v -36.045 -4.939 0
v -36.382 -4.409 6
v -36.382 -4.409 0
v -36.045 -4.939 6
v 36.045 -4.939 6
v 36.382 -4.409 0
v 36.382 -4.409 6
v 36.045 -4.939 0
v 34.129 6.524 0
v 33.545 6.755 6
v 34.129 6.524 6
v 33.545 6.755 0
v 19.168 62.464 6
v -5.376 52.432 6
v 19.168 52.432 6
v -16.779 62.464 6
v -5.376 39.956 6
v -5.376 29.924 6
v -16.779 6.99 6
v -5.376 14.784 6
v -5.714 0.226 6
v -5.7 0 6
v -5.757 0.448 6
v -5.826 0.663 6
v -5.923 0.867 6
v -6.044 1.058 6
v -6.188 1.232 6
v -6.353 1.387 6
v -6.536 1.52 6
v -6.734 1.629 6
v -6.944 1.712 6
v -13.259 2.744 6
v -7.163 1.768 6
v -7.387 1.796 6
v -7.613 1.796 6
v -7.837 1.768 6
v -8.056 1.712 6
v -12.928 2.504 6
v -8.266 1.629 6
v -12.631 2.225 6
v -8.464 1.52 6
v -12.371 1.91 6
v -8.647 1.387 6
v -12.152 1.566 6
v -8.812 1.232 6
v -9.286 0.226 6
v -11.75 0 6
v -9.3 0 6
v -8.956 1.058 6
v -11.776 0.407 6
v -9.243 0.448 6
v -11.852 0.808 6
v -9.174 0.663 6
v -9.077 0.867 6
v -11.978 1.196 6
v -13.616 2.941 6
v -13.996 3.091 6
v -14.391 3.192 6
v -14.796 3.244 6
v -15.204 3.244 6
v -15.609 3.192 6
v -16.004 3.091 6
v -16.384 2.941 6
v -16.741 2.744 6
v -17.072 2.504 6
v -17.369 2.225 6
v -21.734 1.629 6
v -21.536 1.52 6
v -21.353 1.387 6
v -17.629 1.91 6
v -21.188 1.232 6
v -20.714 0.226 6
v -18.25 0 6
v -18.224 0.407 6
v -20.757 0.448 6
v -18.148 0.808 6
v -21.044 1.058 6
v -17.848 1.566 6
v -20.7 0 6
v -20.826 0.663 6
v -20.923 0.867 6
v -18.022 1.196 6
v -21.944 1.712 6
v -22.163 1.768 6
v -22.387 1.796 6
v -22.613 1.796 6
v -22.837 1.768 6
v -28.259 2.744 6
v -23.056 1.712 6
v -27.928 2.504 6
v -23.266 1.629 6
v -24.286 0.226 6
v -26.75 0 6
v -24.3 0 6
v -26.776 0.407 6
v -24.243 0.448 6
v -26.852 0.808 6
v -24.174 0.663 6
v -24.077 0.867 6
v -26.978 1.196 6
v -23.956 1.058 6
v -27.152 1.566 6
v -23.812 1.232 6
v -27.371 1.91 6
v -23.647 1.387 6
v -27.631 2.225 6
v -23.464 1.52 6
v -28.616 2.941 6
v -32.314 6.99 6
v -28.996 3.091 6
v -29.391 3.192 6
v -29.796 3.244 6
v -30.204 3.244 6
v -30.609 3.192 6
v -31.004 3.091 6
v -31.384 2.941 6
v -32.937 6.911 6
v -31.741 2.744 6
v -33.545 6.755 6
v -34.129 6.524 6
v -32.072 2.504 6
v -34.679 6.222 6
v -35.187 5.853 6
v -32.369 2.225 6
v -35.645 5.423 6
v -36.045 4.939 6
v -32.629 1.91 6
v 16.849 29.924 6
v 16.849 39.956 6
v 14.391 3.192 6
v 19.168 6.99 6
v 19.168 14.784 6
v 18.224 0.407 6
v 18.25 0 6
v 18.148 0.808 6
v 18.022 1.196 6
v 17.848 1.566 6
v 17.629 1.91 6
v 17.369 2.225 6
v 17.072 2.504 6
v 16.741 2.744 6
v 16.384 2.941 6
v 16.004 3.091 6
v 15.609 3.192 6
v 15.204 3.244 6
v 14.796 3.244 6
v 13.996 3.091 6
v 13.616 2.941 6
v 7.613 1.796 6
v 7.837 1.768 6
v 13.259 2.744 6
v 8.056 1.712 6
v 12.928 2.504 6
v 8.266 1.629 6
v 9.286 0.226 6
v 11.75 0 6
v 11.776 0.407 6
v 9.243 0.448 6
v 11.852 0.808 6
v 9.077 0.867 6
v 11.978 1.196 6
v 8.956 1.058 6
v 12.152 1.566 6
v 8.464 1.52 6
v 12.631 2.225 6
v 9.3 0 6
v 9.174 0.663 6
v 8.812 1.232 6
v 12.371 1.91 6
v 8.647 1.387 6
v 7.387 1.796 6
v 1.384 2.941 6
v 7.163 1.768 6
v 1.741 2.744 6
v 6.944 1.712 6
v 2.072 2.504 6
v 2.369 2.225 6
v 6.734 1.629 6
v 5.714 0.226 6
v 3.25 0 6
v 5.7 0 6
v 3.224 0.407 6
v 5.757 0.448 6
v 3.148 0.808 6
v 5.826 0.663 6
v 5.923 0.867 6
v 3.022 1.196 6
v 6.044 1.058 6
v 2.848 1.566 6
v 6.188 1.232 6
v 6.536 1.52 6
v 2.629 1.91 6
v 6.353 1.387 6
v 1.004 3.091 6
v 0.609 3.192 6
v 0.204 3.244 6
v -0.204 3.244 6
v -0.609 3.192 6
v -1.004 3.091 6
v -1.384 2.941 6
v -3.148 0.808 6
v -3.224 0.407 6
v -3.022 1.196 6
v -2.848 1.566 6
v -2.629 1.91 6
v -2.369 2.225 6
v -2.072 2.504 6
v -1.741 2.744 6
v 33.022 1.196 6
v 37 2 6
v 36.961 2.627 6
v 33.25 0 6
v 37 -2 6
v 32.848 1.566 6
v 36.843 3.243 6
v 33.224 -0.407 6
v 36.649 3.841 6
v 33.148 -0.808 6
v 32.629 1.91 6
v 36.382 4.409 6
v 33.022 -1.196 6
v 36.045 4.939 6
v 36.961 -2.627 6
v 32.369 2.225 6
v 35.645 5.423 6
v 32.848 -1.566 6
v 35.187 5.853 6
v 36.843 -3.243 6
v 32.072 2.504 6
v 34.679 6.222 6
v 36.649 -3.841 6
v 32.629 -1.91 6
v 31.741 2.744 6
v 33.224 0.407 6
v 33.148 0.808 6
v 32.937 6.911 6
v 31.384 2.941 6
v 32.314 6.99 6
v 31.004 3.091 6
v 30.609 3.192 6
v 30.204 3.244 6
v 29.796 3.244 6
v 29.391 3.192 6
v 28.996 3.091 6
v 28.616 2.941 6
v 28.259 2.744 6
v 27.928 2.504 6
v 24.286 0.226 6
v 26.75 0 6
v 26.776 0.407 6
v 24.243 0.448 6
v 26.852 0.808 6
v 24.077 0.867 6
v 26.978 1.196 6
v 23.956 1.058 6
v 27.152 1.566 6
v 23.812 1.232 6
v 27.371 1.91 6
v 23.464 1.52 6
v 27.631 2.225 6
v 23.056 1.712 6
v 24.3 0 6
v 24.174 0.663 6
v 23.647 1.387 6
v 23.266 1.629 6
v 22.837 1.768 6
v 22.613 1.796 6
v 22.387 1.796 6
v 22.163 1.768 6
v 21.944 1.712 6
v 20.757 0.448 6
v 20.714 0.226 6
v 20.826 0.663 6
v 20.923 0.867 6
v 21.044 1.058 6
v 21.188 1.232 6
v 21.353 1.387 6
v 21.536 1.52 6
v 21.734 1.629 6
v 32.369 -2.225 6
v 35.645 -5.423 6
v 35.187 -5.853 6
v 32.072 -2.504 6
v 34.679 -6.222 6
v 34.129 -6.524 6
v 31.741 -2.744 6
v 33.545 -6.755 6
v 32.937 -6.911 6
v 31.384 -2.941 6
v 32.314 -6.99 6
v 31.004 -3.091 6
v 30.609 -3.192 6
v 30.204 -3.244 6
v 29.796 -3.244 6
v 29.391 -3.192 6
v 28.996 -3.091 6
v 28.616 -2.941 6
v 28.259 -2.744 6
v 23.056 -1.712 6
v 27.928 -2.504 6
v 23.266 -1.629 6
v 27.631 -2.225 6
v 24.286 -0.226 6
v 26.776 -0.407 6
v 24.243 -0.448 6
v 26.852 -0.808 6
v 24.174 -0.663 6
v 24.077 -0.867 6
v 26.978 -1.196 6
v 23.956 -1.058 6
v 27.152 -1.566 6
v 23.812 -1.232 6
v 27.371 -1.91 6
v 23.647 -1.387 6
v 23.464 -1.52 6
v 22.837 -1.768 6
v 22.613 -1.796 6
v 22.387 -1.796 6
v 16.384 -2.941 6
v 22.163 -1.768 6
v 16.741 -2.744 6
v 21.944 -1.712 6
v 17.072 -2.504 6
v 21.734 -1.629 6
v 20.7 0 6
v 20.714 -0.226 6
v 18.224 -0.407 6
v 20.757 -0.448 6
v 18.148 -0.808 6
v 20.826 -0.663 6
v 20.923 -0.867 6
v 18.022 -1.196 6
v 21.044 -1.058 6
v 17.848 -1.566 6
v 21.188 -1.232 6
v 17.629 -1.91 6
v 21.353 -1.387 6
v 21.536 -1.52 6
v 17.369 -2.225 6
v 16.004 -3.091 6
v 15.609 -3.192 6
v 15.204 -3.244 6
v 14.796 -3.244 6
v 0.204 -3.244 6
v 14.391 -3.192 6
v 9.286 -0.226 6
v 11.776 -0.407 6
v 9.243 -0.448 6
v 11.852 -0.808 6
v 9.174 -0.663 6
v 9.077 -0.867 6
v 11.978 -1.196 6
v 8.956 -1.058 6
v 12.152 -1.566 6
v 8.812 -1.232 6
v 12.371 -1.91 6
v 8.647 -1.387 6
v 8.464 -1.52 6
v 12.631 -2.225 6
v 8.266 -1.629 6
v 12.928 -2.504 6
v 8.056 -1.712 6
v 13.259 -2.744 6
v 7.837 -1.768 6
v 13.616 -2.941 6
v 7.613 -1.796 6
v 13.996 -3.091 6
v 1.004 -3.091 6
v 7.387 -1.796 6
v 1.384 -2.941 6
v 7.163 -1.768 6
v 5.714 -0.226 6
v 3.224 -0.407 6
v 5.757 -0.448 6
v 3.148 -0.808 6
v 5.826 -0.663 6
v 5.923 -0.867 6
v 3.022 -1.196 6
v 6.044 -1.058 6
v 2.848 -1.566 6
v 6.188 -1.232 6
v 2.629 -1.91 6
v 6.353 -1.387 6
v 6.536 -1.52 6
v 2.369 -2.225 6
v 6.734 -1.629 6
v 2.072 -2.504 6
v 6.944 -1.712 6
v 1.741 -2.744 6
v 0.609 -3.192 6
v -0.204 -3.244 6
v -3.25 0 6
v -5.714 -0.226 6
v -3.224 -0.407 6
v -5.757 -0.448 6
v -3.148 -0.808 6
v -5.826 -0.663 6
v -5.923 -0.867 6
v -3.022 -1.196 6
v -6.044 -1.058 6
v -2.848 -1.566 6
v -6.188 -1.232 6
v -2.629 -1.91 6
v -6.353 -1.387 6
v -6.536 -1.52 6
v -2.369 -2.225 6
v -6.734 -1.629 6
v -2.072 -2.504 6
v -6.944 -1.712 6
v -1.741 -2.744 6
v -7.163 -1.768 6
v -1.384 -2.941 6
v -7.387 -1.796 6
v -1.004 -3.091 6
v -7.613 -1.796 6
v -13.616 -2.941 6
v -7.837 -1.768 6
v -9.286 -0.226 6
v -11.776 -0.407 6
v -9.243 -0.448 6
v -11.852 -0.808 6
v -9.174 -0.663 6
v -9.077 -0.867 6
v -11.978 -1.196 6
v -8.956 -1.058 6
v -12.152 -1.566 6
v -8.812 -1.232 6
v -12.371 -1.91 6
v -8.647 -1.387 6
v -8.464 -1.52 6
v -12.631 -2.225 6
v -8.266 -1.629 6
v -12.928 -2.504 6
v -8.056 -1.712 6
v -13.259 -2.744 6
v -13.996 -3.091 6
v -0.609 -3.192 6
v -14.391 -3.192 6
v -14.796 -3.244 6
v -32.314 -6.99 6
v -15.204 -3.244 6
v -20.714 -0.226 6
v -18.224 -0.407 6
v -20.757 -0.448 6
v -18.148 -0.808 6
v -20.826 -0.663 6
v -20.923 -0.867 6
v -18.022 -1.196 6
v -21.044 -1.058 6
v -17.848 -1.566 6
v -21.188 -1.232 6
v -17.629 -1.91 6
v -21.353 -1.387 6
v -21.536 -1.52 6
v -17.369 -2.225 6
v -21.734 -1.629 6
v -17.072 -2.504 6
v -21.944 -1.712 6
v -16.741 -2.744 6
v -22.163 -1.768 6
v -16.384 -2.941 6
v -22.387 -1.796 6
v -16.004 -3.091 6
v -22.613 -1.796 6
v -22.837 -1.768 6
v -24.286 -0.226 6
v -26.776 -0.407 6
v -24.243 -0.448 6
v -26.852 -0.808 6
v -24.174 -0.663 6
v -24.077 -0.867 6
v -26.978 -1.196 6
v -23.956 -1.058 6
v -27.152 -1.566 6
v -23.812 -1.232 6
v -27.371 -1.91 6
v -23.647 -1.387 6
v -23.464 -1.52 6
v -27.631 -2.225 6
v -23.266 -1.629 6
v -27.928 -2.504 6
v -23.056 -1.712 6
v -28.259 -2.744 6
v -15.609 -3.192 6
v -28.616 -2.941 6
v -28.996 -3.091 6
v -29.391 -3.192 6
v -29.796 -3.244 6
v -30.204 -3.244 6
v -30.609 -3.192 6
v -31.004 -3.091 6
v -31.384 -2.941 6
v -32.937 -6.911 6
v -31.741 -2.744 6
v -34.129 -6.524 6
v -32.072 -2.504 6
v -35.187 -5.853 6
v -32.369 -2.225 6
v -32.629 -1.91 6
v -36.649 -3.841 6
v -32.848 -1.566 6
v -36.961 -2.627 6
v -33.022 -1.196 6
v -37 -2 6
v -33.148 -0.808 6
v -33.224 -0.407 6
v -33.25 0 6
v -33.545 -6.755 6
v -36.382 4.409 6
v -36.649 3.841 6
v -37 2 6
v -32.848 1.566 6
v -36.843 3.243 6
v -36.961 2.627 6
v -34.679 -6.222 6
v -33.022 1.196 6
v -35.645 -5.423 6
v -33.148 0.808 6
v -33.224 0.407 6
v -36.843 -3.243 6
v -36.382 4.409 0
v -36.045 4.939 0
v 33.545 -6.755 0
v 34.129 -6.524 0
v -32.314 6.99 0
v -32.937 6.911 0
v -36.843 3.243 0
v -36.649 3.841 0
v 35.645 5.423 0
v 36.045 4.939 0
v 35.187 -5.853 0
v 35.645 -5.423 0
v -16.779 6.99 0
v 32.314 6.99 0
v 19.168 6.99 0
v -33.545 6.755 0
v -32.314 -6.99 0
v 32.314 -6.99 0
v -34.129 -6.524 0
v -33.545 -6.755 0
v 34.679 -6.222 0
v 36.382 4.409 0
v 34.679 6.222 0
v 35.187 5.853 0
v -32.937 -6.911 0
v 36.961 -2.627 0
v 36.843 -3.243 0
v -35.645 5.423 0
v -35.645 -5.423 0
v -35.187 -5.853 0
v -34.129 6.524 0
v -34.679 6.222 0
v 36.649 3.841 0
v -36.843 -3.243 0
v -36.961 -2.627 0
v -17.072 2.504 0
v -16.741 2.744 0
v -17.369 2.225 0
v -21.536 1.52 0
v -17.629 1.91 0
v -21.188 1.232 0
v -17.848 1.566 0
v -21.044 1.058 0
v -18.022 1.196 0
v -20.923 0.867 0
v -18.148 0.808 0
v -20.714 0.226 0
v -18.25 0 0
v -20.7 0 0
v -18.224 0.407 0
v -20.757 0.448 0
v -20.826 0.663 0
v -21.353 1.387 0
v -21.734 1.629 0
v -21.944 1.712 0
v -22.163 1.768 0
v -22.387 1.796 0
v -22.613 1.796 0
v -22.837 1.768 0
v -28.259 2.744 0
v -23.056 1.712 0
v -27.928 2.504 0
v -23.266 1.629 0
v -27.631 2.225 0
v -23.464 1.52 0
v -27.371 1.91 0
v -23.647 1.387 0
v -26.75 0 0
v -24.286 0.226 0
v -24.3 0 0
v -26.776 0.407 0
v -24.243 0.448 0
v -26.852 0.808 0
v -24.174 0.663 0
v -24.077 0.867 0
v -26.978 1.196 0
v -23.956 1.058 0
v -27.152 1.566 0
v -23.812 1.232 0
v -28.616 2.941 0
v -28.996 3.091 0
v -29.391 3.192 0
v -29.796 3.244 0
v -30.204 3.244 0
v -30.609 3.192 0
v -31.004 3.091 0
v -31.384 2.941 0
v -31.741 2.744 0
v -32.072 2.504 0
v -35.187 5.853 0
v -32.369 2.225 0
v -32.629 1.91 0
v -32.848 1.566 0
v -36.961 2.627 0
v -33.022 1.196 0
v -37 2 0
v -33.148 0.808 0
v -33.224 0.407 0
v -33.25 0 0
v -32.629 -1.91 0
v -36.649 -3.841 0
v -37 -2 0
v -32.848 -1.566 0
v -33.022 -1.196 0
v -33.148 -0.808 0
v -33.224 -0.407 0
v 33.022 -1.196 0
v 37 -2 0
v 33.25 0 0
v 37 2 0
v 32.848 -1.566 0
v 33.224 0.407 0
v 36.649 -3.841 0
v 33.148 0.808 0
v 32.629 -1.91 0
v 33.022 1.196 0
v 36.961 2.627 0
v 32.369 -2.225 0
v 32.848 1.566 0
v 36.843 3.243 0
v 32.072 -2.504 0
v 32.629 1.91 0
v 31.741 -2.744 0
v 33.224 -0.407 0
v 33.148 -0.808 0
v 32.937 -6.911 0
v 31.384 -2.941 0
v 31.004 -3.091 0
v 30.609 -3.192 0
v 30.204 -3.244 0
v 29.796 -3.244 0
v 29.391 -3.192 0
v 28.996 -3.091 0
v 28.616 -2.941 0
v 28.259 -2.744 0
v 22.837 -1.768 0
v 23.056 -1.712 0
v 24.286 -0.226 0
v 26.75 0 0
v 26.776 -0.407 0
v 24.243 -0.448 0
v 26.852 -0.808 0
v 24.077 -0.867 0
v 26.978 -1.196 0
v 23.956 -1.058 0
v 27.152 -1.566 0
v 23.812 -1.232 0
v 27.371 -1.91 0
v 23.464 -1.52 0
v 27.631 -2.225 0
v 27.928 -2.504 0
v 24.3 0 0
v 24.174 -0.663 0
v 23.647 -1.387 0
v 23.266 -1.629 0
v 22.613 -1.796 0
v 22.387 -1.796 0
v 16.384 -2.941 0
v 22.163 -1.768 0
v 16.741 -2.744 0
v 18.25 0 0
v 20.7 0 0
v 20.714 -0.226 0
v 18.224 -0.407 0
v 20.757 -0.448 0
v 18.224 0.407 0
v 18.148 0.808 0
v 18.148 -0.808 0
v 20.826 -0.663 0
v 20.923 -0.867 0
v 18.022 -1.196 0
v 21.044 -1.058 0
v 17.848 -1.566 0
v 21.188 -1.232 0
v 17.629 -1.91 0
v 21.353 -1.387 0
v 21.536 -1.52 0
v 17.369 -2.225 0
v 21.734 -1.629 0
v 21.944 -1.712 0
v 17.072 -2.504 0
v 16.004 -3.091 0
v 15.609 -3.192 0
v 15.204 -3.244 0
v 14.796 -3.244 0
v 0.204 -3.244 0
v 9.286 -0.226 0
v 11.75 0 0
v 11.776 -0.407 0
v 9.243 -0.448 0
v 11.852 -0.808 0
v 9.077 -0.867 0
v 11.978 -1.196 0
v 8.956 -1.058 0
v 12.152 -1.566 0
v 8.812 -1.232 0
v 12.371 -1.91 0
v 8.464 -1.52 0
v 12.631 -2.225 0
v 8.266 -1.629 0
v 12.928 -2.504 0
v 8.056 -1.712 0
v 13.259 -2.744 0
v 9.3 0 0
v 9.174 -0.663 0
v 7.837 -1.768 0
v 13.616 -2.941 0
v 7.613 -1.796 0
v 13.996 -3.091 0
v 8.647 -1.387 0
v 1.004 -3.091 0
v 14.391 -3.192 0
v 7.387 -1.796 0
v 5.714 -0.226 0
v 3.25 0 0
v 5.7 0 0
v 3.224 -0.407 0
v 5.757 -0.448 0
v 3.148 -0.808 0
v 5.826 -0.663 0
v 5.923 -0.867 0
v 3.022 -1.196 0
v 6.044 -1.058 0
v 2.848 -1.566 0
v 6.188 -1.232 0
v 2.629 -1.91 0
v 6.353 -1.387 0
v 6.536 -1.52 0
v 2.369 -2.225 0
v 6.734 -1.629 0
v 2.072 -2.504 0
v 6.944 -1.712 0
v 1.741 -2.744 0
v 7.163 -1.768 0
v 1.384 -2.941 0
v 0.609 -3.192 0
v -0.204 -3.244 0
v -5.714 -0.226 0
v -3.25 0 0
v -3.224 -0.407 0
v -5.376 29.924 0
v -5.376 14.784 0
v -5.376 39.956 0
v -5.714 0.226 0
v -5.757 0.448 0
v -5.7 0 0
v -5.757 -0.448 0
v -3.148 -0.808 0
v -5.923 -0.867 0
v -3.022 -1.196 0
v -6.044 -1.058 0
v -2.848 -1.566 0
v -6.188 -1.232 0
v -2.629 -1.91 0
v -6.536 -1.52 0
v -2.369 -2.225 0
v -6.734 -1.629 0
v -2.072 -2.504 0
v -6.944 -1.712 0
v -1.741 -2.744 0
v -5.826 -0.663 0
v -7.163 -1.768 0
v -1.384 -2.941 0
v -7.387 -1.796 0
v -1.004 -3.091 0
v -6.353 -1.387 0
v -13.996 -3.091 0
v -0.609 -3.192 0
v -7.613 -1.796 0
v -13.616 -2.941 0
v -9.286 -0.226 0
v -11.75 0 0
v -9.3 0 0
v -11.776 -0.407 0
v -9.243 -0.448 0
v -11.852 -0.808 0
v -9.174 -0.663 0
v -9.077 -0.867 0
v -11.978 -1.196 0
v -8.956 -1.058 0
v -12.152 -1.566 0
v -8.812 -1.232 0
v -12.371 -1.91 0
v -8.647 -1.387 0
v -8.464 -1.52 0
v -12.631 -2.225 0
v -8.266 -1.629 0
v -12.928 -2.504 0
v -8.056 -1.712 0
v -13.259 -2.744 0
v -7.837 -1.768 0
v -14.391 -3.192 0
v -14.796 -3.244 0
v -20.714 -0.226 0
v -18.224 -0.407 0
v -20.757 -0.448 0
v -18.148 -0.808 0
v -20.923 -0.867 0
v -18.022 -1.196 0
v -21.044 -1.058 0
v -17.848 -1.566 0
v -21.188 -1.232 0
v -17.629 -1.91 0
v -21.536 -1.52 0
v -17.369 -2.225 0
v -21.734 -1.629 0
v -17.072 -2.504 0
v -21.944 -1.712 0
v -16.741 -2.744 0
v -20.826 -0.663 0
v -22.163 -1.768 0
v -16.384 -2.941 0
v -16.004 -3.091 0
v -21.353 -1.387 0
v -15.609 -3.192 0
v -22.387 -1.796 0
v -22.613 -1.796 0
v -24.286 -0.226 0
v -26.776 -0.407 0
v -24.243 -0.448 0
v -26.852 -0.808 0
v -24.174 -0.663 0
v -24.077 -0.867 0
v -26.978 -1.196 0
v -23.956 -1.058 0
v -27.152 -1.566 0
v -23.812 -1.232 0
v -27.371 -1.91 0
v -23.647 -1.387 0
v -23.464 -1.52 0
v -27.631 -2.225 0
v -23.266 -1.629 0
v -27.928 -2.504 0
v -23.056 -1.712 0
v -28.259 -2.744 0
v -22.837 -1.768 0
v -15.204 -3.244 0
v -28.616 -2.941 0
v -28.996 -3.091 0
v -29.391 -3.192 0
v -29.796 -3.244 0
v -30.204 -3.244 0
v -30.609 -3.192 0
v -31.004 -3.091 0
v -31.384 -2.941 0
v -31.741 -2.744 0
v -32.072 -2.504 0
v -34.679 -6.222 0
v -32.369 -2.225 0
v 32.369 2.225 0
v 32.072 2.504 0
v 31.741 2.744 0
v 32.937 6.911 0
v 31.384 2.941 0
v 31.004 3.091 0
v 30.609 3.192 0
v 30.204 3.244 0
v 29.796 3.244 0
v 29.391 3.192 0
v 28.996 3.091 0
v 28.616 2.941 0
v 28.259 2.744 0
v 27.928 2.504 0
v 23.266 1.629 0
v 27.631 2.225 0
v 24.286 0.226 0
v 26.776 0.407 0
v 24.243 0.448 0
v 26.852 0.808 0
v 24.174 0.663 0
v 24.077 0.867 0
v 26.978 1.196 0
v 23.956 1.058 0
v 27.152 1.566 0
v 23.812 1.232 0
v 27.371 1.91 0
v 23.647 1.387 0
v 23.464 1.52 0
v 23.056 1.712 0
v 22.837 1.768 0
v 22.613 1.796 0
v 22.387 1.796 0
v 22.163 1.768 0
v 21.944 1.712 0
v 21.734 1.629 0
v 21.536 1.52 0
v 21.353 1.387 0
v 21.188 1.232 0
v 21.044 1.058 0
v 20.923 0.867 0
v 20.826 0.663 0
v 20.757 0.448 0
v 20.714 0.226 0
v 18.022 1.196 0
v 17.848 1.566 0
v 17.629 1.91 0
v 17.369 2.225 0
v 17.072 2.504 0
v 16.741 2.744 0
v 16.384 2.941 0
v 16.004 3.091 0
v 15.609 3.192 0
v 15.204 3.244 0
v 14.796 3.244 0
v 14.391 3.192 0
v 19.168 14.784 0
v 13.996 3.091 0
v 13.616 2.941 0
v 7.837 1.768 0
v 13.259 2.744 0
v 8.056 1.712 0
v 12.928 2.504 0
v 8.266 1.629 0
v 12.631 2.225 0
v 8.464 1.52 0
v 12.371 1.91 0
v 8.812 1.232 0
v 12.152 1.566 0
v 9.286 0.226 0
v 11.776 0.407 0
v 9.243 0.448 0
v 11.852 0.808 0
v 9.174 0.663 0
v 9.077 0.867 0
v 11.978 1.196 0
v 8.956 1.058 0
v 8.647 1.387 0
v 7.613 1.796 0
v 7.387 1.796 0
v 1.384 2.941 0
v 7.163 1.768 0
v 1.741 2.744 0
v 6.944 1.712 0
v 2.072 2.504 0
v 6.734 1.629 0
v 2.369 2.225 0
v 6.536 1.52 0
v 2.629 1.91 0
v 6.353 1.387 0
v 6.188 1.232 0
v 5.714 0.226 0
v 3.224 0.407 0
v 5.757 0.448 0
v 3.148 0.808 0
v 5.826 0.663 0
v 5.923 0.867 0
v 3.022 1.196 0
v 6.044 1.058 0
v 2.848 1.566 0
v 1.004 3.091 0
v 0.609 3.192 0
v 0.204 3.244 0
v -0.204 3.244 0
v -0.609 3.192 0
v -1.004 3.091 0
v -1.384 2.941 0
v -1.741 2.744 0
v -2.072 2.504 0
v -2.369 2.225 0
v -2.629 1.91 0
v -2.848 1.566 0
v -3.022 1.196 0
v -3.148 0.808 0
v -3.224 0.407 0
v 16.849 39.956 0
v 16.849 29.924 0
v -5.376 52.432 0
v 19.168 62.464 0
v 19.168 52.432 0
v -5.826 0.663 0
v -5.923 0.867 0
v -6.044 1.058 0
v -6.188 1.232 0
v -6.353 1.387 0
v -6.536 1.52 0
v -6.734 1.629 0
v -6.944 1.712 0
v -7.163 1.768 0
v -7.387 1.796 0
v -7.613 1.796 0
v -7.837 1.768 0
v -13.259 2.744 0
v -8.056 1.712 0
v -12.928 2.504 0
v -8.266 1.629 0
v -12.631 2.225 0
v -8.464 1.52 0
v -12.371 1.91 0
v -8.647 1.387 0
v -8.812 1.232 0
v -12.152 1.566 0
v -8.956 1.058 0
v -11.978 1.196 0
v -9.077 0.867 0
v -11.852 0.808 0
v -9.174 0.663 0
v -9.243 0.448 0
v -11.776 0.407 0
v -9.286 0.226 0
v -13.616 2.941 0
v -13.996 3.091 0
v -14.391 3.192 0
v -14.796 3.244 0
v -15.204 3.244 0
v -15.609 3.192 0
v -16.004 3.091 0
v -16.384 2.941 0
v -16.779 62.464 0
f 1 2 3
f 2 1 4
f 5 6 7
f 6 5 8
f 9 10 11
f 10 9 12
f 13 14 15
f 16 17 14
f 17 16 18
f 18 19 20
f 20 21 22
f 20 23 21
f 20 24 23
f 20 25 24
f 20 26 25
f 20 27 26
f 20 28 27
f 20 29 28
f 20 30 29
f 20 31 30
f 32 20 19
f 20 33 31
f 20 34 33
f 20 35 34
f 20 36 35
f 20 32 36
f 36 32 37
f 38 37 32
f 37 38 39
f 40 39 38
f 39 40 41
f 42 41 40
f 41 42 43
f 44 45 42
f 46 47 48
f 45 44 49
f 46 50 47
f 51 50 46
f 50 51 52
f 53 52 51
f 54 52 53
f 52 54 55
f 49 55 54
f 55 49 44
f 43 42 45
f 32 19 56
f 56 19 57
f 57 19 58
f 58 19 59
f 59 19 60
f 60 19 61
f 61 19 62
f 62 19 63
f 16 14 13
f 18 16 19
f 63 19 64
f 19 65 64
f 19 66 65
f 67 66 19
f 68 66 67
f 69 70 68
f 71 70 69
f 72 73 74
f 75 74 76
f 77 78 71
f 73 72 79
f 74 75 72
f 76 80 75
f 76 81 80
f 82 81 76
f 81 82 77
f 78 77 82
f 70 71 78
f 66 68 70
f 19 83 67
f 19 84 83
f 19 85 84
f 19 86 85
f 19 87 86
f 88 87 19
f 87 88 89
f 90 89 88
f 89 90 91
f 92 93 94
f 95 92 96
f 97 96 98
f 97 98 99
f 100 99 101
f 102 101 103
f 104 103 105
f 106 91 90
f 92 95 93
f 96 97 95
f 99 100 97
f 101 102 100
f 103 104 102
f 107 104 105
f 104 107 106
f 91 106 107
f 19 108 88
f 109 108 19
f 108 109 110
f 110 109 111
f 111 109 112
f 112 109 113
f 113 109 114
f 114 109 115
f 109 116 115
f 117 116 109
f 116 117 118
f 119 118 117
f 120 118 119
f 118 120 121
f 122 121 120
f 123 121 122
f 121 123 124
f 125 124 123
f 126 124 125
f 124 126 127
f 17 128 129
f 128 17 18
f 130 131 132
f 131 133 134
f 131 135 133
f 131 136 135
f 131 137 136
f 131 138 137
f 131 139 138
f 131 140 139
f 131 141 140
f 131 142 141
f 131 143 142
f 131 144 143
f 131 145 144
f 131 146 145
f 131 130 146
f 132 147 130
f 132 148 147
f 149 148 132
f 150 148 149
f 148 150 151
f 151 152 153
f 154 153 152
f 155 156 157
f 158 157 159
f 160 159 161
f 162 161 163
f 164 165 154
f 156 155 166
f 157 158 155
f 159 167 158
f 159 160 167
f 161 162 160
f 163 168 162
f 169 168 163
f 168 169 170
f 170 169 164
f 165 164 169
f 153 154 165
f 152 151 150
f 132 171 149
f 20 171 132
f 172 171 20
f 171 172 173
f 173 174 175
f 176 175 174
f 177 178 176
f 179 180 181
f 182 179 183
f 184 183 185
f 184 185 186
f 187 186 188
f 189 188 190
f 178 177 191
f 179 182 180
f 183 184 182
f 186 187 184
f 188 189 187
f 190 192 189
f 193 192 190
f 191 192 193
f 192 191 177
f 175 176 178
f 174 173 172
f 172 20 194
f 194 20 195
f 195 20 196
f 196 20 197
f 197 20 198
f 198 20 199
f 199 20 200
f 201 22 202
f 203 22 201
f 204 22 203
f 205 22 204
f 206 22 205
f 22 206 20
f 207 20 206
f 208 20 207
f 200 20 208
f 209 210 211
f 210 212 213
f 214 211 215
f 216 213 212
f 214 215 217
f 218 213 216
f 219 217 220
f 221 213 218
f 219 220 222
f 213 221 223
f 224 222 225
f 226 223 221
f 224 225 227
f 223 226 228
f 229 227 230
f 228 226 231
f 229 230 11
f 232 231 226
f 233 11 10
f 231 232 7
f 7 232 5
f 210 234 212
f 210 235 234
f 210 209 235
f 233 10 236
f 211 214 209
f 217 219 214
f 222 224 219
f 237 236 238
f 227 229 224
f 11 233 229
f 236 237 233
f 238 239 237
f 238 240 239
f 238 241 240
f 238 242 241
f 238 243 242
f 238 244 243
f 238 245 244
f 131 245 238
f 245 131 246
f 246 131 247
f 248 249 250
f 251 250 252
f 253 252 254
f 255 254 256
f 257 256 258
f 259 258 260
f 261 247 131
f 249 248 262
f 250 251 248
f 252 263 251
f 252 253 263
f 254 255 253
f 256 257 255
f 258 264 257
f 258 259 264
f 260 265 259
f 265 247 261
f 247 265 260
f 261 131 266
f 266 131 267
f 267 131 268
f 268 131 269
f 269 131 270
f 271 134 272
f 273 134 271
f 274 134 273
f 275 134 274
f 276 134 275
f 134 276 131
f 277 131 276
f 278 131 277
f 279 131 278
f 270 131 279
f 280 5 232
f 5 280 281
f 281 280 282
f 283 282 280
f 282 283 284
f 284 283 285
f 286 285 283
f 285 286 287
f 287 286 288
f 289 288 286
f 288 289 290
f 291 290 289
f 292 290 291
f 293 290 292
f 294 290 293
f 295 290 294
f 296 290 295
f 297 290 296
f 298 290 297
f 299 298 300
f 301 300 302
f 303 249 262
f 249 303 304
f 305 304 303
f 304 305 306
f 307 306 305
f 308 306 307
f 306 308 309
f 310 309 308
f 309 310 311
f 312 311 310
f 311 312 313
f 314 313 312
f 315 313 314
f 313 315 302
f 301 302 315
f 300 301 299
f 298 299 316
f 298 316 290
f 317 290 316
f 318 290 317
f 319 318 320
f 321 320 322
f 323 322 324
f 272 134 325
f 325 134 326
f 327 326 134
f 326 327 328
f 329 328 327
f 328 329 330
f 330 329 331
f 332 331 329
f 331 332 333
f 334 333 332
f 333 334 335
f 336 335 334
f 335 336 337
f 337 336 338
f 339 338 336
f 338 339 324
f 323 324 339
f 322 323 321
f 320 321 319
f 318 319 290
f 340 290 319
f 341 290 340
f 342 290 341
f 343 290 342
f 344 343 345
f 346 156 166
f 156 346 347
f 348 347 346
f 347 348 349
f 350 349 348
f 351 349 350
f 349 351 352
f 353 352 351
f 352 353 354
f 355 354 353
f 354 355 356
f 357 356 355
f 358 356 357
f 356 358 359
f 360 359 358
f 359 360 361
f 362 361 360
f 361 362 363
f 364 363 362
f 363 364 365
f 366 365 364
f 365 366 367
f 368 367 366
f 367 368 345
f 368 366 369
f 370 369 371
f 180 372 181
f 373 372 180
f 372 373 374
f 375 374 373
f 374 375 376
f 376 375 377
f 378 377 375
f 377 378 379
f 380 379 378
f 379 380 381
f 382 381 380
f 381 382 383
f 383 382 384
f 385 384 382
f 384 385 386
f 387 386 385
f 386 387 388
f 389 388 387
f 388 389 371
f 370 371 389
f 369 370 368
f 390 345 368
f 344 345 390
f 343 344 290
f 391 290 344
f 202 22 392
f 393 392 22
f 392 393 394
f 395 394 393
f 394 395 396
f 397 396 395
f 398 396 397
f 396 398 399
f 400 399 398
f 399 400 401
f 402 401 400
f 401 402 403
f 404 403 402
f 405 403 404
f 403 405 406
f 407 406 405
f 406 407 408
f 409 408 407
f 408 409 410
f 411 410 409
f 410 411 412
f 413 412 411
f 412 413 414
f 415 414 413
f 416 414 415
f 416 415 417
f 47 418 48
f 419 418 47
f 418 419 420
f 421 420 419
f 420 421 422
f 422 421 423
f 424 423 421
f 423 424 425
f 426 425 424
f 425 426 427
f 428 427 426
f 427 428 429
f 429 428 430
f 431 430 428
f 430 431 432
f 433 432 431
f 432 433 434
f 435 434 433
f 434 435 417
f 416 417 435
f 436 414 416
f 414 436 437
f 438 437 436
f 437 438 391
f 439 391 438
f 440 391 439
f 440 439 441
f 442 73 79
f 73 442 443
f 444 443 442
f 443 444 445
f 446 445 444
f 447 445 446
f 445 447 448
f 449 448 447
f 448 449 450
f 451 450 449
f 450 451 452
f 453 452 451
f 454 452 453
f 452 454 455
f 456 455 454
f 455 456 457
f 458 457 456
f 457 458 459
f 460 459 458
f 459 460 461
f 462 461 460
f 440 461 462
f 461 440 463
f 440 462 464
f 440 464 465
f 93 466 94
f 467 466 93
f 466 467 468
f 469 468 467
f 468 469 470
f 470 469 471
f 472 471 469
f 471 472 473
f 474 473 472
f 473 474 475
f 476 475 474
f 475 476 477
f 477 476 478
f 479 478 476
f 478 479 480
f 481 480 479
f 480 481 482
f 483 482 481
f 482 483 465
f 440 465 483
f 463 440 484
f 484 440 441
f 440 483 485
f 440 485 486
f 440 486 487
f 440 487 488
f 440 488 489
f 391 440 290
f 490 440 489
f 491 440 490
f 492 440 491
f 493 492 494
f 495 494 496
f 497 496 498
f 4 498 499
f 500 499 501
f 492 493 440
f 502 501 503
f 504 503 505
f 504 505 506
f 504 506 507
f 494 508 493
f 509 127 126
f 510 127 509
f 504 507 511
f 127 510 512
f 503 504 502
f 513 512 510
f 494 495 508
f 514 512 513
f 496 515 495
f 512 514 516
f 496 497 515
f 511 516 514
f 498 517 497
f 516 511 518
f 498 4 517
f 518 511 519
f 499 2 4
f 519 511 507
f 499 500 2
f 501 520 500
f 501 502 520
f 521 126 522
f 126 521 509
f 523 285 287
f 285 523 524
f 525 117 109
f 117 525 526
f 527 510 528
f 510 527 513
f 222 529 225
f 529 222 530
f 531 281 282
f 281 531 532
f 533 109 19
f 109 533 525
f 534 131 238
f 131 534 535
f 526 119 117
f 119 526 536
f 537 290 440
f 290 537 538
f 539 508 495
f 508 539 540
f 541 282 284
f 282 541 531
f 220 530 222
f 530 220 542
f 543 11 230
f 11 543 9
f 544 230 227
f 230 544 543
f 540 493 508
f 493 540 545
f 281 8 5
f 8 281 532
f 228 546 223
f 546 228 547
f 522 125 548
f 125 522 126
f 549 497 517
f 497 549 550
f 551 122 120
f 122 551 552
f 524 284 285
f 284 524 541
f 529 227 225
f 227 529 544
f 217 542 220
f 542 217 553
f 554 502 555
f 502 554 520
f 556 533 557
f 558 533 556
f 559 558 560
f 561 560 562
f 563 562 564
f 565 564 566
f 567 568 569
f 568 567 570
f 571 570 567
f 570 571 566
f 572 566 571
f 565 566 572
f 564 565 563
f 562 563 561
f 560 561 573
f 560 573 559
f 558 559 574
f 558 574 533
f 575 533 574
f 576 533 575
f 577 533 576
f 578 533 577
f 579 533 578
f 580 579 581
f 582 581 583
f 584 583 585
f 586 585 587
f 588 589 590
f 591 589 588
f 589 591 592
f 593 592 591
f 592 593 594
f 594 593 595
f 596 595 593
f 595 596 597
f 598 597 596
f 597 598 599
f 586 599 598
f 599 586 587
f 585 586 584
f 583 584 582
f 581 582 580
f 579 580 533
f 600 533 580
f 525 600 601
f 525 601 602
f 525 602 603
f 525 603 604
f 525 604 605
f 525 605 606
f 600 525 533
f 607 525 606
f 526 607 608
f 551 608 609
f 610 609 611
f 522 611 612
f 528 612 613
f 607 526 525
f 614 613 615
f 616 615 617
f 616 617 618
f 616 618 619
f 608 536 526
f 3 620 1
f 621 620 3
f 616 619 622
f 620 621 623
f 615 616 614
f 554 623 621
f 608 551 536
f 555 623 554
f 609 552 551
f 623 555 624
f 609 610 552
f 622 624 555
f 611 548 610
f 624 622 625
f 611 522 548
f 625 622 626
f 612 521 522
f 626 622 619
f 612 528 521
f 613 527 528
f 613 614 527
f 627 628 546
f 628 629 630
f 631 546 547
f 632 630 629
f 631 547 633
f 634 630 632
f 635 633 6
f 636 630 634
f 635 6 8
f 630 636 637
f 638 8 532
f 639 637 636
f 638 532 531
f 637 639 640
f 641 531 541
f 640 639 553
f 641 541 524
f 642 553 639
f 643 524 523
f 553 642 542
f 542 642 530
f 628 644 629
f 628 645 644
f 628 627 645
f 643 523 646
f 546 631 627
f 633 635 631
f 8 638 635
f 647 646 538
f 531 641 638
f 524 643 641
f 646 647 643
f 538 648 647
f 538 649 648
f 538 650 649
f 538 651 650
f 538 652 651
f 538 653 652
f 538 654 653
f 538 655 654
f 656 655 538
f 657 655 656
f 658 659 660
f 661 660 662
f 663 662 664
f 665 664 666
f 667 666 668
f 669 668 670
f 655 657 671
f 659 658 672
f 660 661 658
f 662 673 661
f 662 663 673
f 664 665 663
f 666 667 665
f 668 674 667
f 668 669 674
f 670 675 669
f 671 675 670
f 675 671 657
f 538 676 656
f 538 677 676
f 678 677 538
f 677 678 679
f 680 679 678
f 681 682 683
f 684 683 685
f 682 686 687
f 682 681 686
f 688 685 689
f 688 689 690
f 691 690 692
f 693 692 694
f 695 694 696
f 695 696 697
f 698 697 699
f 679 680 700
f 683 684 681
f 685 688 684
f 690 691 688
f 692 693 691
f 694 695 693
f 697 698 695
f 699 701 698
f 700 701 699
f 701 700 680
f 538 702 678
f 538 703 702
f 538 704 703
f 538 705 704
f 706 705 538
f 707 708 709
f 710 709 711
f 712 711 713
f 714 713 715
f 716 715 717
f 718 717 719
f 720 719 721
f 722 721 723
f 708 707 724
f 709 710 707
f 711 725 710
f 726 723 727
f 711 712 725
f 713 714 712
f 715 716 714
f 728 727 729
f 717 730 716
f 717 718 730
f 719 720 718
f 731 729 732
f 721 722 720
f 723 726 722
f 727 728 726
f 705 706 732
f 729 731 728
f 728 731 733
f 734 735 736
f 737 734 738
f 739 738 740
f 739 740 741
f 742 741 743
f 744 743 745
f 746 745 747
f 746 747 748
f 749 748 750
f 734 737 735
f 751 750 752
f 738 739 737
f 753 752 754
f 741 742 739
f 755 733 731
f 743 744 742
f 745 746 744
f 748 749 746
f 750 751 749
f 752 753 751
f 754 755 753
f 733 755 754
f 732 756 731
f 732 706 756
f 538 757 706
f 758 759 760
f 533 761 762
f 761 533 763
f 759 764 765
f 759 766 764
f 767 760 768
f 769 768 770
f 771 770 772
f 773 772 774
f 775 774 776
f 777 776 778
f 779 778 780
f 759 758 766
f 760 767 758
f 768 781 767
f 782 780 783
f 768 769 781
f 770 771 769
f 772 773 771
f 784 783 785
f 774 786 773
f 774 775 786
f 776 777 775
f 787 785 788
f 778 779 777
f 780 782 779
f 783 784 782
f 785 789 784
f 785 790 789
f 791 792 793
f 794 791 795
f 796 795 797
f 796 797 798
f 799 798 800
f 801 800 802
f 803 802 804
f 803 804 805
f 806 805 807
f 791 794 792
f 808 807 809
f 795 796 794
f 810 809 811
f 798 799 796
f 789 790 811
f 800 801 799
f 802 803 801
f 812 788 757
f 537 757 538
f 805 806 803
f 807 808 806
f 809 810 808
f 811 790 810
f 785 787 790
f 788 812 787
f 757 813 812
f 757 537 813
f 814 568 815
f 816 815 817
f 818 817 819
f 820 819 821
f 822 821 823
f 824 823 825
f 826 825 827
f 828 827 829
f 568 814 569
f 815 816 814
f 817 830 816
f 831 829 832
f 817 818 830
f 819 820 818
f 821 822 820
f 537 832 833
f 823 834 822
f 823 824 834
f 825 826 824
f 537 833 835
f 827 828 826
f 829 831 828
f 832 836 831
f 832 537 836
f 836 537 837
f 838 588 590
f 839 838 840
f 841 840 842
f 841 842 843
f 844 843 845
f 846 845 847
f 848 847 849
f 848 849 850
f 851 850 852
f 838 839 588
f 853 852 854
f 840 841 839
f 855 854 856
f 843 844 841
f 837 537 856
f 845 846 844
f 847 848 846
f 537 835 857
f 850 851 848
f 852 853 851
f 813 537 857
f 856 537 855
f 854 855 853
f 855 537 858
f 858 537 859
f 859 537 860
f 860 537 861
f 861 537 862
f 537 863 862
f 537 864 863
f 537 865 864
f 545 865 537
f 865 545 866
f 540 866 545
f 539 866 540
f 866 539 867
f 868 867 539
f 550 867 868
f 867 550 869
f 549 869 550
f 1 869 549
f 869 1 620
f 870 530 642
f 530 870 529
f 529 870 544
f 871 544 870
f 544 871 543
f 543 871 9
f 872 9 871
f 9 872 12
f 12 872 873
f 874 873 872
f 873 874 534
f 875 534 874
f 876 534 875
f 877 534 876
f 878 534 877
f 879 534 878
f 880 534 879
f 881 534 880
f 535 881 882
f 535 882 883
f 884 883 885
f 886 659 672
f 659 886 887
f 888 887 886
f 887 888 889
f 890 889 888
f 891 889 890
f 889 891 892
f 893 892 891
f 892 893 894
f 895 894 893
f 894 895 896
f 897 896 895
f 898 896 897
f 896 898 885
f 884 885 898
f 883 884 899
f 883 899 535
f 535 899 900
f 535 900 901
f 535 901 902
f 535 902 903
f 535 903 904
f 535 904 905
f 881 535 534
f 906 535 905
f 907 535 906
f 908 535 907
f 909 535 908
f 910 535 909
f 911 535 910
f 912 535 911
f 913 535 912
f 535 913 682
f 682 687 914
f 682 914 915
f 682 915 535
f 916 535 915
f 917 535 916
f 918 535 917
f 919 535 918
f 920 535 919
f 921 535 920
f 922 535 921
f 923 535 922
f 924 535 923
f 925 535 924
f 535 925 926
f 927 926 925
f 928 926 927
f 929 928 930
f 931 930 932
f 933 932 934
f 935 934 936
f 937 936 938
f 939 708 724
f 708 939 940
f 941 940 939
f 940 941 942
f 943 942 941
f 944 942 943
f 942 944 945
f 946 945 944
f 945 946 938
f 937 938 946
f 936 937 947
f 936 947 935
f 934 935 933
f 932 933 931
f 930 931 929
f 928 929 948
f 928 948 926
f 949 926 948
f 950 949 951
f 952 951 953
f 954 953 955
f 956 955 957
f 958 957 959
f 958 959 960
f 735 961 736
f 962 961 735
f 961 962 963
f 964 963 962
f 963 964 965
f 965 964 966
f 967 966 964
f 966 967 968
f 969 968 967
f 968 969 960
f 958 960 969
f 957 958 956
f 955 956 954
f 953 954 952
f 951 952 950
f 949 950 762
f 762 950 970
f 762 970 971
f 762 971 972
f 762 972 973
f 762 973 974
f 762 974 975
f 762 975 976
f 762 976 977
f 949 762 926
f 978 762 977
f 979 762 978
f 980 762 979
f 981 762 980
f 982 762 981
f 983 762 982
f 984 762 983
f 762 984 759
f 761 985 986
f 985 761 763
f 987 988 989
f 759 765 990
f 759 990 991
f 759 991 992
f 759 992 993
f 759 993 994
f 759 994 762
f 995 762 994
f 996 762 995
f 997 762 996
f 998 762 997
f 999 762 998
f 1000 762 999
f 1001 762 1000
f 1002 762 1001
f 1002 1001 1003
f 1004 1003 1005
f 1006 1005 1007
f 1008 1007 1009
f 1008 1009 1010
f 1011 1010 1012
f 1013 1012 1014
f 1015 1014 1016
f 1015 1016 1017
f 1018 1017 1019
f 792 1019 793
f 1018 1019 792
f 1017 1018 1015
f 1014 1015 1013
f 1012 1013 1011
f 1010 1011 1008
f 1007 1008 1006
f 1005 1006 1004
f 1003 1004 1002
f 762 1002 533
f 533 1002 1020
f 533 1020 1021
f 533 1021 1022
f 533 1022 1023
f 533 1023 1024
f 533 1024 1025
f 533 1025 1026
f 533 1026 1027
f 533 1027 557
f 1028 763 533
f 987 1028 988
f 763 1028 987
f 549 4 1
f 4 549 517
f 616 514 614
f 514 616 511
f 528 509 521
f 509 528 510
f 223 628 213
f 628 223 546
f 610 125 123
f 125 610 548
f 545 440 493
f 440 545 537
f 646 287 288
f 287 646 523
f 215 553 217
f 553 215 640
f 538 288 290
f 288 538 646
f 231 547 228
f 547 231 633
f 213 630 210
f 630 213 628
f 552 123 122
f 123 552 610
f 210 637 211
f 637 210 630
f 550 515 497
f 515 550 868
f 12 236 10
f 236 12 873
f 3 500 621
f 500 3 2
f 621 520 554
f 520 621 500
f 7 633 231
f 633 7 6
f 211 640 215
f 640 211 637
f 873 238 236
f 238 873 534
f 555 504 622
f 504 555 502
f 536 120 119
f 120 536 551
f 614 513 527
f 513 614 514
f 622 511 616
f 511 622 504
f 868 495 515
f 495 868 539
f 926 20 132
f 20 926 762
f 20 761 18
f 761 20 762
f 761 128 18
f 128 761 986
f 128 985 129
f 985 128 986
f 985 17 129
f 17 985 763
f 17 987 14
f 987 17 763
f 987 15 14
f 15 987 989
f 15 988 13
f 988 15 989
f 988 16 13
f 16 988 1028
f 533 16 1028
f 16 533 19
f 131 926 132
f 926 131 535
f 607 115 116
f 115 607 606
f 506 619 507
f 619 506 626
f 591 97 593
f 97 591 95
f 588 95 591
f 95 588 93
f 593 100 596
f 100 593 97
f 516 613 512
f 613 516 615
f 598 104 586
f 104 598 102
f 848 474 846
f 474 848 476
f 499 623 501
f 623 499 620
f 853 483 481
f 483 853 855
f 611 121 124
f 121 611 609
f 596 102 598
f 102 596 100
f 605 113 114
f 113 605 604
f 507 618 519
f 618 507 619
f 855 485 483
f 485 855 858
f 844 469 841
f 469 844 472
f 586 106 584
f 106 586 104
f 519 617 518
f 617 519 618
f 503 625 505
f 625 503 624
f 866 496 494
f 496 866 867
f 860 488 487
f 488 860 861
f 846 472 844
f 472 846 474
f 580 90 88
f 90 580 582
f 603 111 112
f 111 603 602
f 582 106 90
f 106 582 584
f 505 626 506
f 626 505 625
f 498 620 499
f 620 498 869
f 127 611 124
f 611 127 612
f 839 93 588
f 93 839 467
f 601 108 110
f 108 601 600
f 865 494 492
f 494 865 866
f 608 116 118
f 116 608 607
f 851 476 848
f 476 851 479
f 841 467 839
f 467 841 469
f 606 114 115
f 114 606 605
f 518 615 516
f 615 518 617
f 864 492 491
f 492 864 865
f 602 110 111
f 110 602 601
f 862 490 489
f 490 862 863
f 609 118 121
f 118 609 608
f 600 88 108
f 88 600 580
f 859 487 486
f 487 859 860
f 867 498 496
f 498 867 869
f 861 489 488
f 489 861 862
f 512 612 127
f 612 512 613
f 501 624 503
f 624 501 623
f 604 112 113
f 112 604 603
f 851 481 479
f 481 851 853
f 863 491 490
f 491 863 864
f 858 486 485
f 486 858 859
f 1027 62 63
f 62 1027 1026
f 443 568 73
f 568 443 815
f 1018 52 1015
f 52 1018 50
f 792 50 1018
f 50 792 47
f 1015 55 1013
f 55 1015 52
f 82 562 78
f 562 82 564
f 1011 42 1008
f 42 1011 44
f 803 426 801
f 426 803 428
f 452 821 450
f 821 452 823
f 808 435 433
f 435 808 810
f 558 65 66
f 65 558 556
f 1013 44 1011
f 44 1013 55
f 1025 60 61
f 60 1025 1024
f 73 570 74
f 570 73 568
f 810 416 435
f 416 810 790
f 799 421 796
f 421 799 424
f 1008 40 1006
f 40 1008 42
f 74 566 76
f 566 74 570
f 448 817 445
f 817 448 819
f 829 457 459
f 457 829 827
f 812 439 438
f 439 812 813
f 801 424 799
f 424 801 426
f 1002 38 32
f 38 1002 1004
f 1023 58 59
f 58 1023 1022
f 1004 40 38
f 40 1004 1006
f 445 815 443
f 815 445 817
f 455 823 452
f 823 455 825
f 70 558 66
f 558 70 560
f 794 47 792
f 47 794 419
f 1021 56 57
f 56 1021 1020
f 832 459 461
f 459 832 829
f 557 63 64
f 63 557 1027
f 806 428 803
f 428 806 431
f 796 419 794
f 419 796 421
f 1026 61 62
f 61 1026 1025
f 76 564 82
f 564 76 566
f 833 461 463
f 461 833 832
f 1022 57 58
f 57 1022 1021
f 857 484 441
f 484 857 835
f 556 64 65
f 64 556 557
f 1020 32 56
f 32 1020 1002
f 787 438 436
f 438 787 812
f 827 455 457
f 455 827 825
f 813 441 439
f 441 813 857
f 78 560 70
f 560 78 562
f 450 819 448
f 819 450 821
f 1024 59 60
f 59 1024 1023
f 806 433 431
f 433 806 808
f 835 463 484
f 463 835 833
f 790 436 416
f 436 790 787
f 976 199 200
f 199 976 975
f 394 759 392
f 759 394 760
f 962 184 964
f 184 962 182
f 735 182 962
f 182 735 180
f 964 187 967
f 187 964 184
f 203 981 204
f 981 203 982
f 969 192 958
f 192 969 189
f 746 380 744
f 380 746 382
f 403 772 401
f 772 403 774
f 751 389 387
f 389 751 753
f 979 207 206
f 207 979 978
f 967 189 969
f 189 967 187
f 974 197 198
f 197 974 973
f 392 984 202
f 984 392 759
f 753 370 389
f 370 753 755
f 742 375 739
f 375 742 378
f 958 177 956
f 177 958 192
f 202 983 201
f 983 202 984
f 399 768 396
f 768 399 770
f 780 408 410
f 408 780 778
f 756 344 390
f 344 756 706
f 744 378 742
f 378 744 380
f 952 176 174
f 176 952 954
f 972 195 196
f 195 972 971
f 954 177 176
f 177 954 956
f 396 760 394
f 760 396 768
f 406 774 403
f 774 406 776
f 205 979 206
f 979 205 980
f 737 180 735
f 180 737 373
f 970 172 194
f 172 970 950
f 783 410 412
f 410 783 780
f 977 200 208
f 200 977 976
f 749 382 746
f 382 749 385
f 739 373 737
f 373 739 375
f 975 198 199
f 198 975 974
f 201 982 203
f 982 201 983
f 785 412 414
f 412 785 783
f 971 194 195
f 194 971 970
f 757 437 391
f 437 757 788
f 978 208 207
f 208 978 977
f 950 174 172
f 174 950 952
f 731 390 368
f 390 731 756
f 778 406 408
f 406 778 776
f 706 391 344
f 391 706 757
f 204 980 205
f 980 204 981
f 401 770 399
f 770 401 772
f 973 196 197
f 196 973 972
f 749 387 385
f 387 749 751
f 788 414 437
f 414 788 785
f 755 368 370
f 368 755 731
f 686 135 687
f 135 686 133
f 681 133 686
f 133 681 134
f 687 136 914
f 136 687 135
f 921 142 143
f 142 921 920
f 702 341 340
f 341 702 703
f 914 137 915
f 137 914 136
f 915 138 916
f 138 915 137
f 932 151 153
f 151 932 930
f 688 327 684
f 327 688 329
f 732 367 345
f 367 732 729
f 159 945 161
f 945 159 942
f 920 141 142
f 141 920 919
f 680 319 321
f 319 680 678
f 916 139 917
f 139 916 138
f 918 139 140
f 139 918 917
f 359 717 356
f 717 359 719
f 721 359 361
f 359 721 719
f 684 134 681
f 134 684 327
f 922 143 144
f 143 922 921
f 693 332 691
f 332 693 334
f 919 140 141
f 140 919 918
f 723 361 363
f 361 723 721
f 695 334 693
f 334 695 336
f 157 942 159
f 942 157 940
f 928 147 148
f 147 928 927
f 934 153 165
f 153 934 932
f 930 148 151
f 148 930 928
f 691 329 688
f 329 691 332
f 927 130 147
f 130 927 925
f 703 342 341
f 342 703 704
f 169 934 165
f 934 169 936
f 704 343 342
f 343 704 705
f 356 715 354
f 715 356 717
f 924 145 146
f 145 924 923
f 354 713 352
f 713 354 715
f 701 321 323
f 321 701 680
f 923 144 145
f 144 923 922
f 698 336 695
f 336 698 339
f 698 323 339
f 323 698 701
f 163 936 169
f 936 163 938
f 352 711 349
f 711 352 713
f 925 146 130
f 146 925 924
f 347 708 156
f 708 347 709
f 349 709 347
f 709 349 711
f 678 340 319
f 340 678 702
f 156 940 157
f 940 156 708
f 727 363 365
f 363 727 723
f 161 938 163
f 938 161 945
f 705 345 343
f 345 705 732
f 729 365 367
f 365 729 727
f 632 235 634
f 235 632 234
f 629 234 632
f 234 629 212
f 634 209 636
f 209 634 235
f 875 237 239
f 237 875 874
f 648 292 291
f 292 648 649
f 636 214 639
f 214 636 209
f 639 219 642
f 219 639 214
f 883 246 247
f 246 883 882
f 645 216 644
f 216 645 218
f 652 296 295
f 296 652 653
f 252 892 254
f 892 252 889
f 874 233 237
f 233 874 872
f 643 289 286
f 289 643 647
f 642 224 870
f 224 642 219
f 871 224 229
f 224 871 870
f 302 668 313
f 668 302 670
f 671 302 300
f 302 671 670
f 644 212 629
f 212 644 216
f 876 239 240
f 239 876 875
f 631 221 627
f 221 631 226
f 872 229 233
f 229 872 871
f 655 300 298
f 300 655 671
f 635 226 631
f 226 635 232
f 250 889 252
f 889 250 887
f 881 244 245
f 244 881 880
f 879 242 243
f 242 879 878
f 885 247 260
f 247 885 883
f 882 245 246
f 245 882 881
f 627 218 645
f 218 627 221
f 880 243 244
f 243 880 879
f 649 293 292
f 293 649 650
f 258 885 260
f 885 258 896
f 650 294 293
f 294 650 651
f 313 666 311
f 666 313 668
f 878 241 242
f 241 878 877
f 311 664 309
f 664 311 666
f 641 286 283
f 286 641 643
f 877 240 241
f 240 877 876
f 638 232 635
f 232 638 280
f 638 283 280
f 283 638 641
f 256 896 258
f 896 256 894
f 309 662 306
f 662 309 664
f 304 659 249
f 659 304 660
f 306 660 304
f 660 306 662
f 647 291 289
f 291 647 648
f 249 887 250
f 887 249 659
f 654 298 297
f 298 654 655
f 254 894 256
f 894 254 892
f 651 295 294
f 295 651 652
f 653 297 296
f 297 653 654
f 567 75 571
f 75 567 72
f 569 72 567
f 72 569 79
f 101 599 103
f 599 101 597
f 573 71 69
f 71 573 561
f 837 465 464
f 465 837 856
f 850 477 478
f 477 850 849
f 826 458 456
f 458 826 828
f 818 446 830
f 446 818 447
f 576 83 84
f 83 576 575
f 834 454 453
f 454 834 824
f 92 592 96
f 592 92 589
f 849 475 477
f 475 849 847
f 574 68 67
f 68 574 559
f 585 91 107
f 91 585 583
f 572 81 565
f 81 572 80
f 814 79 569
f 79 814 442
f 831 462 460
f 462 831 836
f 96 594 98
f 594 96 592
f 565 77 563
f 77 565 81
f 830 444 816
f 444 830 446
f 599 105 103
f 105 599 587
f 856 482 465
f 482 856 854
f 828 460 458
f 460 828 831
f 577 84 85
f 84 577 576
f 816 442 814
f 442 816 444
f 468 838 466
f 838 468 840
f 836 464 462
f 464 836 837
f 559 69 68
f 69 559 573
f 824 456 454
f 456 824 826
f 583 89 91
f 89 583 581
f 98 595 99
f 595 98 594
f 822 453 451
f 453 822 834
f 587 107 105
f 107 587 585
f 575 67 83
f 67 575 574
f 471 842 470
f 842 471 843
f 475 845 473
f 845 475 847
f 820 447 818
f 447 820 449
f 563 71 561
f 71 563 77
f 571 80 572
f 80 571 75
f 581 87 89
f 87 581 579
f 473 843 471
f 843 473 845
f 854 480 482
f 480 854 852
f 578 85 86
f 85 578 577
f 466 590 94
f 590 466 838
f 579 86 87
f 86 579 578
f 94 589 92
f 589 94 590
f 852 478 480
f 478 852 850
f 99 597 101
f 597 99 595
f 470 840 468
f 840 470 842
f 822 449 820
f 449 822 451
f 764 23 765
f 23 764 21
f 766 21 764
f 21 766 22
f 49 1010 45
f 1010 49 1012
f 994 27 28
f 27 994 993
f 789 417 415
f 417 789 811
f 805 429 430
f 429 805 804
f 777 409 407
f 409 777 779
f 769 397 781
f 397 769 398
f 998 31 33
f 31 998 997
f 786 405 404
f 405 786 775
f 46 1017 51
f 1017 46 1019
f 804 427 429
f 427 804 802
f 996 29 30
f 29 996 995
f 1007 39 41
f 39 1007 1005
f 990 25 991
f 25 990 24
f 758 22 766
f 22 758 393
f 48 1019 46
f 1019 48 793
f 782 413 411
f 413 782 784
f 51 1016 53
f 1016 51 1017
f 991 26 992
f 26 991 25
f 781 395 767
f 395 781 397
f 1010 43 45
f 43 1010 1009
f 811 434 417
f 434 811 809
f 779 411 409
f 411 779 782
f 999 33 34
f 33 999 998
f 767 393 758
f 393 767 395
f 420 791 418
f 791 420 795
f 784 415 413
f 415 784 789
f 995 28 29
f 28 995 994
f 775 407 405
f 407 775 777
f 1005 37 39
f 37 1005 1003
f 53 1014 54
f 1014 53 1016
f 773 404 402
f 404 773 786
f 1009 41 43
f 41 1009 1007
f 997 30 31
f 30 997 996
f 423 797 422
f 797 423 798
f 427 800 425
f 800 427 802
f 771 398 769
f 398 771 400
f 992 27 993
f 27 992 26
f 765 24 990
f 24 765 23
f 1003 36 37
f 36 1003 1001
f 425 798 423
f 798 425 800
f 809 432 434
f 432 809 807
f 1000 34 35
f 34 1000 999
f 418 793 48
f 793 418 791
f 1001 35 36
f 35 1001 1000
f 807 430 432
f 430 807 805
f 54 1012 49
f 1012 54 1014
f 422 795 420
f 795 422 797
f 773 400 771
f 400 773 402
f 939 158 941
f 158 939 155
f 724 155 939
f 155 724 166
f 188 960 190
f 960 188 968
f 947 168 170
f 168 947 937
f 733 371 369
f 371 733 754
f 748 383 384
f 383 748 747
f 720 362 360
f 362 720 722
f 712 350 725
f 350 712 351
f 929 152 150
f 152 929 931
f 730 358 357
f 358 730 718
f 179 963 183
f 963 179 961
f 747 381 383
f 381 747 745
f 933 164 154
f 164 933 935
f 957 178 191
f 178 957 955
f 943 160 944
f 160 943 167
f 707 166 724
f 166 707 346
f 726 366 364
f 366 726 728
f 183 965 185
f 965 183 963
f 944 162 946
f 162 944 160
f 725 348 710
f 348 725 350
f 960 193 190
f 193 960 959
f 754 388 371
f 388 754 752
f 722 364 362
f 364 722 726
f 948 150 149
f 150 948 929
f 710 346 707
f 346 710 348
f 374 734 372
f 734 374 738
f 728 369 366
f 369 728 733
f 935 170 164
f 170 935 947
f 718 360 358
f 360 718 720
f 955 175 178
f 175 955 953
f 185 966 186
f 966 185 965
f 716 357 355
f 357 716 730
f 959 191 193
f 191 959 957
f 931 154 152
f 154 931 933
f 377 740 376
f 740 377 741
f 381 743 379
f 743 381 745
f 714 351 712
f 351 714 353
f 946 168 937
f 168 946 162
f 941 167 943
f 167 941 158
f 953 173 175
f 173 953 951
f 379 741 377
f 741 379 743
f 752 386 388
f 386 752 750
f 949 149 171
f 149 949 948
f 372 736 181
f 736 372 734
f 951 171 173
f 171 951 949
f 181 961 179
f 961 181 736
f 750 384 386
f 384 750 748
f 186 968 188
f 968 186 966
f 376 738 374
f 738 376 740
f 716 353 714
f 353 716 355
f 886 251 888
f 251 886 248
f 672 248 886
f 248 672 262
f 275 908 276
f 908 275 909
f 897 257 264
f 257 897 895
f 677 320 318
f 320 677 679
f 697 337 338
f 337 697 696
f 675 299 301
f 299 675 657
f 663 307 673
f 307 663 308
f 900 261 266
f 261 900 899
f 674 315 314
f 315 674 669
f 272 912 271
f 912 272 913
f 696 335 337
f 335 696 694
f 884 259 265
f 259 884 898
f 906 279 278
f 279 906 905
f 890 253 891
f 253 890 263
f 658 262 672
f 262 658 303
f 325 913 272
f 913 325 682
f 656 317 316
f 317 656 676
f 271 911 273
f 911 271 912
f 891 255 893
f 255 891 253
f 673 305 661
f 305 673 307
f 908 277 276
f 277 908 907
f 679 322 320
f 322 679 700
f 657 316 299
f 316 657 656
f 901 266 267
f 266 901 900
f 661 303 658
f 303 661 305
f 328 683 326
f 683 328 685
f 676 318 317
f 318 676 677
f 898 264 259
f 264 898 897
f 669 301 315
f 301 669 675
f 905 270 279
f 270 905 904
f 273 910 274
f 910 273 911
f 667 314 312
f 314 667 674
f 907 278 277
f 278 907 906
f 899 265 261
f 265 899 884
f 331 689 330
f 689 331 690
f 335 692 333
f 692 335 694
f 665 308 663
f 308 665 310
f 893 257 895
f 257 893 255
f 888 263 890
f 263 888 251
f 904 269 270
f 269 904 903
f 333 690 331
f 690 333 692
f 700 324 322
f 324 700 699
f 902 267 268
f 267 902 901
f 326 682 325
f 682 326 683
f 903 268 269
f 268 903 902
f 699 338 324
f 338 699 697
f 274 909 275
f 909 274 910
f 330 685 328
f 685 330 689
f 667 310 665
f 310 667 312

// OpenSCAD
$fn = 50;


difference() {
	union() {
		hull() {
			translate(v = [-32.0000000000, 2.0000000000, 0]) {
				cylinder(h = 6, r = 5);
			}
			translate(v = [32.0000000000, 2.0000000000, 0]) {
				cylinder(h = 6, r = 5);
			}
			translate(v = [-32.0000000000, -2.0000000000, 0]) {
				cylinder(h = 6, r = 5);
			}
			translate(v = [32.0000000000, -2.0000000000, 0]) {
				cylinder(h = 6, r = 5);
			}
		}
		translate(v = [0, 61.1111111111, 0]) {
			linear_extrude(height = 6) {
				text(font = "DejaVu Sans Mono:style=Bold", halign = "center", size = 57.0000000000, text = "E", valign = "top");
			}
		}
	}
	union() {
		translate(v = [-30.0000000000, 0.0000000000, 0]) {
			translate(v = [0, 0, -100]) {
				cylinder(h = 200, r = 3.2500000000);
			}
		}
		translate(v = [-15.0000000000, 0.0000000000, 0]) {
			translate(v = [0, 0, -100]) {
				cylinder(h = 200, r = 3.2500000000);
			}
		}
		translate(v = [0, 0, -100]) {
			cylinder(h = 200, r = 3.2500000000);
		}
		translate(v = [15.0000000000, 0.0000000000, 0]) {
			translate(v = [0, 0, -100]) {
				cylinder(h = 200, r = 3.2500000000);
			}
		}
		translate(v = [30.0000000000, 0.0000000000, 0]) {
			translate(v = [0, 0, -100]) {
				cylinder(h = 200, r = 3.2500000000);
			}
		}
		translate(v = [-30.0000000000, 0.0000000000, 0]) {
			translate(v = [0, 0, -100]) {
				cylinder(h = 200, r = 1.8000000000);
			}
		}
		translate(v = [-22.5000000000, 0.0000000000, 0]) {
			translate(v = [0, 0, -100]) {
				cylinder(h = 200, r = 1.8000000000);
			}
		}
		translate(v = [-15.0000000000, 0.0000000000, 0]) {
			translate(v = [0, 0, -100]) {
				cylinder(h = 200, r = 1.8000000000);
			}
		}
		translate(v = [-7.5000000000, 0.0000000000, 0]) {
			translate(v = [0, 0, -100]) {
				cylinder(h = 200, r = 1.8000000000);
			}
		}
		translate(v = [0, 0, -100]) {
			cylinder(h = 200, r = 1.8000000000);
		}
		translate(v = [7.5000000000, 0.0000000000, 0]) {
			translate(v = [0, 0, -100]) {
				cylinder(h = 200, r = 1.8000000000);
			}
		}
		translate(v = [15.0000000000, 0.0000000000, 0]) {
			translate(v = [0, 0, -100]) {
				cylinder(h = 200, r = 1.8000000000);
			}
		}
		translate(v = [22.5000000000, 0.0000000000, 0]) {
			translate(v = [0, 0, -100]) {
				cylinder(h = 200, r = 1.8000000000);
			}
		}
		translate(v = [30.0000000000, 0.0000000000, 0]) {
			translate(v = [0, 0, -100]) {
				cylinder(h = 200, r = 1.8000000000);
			}
		}
	}
}
